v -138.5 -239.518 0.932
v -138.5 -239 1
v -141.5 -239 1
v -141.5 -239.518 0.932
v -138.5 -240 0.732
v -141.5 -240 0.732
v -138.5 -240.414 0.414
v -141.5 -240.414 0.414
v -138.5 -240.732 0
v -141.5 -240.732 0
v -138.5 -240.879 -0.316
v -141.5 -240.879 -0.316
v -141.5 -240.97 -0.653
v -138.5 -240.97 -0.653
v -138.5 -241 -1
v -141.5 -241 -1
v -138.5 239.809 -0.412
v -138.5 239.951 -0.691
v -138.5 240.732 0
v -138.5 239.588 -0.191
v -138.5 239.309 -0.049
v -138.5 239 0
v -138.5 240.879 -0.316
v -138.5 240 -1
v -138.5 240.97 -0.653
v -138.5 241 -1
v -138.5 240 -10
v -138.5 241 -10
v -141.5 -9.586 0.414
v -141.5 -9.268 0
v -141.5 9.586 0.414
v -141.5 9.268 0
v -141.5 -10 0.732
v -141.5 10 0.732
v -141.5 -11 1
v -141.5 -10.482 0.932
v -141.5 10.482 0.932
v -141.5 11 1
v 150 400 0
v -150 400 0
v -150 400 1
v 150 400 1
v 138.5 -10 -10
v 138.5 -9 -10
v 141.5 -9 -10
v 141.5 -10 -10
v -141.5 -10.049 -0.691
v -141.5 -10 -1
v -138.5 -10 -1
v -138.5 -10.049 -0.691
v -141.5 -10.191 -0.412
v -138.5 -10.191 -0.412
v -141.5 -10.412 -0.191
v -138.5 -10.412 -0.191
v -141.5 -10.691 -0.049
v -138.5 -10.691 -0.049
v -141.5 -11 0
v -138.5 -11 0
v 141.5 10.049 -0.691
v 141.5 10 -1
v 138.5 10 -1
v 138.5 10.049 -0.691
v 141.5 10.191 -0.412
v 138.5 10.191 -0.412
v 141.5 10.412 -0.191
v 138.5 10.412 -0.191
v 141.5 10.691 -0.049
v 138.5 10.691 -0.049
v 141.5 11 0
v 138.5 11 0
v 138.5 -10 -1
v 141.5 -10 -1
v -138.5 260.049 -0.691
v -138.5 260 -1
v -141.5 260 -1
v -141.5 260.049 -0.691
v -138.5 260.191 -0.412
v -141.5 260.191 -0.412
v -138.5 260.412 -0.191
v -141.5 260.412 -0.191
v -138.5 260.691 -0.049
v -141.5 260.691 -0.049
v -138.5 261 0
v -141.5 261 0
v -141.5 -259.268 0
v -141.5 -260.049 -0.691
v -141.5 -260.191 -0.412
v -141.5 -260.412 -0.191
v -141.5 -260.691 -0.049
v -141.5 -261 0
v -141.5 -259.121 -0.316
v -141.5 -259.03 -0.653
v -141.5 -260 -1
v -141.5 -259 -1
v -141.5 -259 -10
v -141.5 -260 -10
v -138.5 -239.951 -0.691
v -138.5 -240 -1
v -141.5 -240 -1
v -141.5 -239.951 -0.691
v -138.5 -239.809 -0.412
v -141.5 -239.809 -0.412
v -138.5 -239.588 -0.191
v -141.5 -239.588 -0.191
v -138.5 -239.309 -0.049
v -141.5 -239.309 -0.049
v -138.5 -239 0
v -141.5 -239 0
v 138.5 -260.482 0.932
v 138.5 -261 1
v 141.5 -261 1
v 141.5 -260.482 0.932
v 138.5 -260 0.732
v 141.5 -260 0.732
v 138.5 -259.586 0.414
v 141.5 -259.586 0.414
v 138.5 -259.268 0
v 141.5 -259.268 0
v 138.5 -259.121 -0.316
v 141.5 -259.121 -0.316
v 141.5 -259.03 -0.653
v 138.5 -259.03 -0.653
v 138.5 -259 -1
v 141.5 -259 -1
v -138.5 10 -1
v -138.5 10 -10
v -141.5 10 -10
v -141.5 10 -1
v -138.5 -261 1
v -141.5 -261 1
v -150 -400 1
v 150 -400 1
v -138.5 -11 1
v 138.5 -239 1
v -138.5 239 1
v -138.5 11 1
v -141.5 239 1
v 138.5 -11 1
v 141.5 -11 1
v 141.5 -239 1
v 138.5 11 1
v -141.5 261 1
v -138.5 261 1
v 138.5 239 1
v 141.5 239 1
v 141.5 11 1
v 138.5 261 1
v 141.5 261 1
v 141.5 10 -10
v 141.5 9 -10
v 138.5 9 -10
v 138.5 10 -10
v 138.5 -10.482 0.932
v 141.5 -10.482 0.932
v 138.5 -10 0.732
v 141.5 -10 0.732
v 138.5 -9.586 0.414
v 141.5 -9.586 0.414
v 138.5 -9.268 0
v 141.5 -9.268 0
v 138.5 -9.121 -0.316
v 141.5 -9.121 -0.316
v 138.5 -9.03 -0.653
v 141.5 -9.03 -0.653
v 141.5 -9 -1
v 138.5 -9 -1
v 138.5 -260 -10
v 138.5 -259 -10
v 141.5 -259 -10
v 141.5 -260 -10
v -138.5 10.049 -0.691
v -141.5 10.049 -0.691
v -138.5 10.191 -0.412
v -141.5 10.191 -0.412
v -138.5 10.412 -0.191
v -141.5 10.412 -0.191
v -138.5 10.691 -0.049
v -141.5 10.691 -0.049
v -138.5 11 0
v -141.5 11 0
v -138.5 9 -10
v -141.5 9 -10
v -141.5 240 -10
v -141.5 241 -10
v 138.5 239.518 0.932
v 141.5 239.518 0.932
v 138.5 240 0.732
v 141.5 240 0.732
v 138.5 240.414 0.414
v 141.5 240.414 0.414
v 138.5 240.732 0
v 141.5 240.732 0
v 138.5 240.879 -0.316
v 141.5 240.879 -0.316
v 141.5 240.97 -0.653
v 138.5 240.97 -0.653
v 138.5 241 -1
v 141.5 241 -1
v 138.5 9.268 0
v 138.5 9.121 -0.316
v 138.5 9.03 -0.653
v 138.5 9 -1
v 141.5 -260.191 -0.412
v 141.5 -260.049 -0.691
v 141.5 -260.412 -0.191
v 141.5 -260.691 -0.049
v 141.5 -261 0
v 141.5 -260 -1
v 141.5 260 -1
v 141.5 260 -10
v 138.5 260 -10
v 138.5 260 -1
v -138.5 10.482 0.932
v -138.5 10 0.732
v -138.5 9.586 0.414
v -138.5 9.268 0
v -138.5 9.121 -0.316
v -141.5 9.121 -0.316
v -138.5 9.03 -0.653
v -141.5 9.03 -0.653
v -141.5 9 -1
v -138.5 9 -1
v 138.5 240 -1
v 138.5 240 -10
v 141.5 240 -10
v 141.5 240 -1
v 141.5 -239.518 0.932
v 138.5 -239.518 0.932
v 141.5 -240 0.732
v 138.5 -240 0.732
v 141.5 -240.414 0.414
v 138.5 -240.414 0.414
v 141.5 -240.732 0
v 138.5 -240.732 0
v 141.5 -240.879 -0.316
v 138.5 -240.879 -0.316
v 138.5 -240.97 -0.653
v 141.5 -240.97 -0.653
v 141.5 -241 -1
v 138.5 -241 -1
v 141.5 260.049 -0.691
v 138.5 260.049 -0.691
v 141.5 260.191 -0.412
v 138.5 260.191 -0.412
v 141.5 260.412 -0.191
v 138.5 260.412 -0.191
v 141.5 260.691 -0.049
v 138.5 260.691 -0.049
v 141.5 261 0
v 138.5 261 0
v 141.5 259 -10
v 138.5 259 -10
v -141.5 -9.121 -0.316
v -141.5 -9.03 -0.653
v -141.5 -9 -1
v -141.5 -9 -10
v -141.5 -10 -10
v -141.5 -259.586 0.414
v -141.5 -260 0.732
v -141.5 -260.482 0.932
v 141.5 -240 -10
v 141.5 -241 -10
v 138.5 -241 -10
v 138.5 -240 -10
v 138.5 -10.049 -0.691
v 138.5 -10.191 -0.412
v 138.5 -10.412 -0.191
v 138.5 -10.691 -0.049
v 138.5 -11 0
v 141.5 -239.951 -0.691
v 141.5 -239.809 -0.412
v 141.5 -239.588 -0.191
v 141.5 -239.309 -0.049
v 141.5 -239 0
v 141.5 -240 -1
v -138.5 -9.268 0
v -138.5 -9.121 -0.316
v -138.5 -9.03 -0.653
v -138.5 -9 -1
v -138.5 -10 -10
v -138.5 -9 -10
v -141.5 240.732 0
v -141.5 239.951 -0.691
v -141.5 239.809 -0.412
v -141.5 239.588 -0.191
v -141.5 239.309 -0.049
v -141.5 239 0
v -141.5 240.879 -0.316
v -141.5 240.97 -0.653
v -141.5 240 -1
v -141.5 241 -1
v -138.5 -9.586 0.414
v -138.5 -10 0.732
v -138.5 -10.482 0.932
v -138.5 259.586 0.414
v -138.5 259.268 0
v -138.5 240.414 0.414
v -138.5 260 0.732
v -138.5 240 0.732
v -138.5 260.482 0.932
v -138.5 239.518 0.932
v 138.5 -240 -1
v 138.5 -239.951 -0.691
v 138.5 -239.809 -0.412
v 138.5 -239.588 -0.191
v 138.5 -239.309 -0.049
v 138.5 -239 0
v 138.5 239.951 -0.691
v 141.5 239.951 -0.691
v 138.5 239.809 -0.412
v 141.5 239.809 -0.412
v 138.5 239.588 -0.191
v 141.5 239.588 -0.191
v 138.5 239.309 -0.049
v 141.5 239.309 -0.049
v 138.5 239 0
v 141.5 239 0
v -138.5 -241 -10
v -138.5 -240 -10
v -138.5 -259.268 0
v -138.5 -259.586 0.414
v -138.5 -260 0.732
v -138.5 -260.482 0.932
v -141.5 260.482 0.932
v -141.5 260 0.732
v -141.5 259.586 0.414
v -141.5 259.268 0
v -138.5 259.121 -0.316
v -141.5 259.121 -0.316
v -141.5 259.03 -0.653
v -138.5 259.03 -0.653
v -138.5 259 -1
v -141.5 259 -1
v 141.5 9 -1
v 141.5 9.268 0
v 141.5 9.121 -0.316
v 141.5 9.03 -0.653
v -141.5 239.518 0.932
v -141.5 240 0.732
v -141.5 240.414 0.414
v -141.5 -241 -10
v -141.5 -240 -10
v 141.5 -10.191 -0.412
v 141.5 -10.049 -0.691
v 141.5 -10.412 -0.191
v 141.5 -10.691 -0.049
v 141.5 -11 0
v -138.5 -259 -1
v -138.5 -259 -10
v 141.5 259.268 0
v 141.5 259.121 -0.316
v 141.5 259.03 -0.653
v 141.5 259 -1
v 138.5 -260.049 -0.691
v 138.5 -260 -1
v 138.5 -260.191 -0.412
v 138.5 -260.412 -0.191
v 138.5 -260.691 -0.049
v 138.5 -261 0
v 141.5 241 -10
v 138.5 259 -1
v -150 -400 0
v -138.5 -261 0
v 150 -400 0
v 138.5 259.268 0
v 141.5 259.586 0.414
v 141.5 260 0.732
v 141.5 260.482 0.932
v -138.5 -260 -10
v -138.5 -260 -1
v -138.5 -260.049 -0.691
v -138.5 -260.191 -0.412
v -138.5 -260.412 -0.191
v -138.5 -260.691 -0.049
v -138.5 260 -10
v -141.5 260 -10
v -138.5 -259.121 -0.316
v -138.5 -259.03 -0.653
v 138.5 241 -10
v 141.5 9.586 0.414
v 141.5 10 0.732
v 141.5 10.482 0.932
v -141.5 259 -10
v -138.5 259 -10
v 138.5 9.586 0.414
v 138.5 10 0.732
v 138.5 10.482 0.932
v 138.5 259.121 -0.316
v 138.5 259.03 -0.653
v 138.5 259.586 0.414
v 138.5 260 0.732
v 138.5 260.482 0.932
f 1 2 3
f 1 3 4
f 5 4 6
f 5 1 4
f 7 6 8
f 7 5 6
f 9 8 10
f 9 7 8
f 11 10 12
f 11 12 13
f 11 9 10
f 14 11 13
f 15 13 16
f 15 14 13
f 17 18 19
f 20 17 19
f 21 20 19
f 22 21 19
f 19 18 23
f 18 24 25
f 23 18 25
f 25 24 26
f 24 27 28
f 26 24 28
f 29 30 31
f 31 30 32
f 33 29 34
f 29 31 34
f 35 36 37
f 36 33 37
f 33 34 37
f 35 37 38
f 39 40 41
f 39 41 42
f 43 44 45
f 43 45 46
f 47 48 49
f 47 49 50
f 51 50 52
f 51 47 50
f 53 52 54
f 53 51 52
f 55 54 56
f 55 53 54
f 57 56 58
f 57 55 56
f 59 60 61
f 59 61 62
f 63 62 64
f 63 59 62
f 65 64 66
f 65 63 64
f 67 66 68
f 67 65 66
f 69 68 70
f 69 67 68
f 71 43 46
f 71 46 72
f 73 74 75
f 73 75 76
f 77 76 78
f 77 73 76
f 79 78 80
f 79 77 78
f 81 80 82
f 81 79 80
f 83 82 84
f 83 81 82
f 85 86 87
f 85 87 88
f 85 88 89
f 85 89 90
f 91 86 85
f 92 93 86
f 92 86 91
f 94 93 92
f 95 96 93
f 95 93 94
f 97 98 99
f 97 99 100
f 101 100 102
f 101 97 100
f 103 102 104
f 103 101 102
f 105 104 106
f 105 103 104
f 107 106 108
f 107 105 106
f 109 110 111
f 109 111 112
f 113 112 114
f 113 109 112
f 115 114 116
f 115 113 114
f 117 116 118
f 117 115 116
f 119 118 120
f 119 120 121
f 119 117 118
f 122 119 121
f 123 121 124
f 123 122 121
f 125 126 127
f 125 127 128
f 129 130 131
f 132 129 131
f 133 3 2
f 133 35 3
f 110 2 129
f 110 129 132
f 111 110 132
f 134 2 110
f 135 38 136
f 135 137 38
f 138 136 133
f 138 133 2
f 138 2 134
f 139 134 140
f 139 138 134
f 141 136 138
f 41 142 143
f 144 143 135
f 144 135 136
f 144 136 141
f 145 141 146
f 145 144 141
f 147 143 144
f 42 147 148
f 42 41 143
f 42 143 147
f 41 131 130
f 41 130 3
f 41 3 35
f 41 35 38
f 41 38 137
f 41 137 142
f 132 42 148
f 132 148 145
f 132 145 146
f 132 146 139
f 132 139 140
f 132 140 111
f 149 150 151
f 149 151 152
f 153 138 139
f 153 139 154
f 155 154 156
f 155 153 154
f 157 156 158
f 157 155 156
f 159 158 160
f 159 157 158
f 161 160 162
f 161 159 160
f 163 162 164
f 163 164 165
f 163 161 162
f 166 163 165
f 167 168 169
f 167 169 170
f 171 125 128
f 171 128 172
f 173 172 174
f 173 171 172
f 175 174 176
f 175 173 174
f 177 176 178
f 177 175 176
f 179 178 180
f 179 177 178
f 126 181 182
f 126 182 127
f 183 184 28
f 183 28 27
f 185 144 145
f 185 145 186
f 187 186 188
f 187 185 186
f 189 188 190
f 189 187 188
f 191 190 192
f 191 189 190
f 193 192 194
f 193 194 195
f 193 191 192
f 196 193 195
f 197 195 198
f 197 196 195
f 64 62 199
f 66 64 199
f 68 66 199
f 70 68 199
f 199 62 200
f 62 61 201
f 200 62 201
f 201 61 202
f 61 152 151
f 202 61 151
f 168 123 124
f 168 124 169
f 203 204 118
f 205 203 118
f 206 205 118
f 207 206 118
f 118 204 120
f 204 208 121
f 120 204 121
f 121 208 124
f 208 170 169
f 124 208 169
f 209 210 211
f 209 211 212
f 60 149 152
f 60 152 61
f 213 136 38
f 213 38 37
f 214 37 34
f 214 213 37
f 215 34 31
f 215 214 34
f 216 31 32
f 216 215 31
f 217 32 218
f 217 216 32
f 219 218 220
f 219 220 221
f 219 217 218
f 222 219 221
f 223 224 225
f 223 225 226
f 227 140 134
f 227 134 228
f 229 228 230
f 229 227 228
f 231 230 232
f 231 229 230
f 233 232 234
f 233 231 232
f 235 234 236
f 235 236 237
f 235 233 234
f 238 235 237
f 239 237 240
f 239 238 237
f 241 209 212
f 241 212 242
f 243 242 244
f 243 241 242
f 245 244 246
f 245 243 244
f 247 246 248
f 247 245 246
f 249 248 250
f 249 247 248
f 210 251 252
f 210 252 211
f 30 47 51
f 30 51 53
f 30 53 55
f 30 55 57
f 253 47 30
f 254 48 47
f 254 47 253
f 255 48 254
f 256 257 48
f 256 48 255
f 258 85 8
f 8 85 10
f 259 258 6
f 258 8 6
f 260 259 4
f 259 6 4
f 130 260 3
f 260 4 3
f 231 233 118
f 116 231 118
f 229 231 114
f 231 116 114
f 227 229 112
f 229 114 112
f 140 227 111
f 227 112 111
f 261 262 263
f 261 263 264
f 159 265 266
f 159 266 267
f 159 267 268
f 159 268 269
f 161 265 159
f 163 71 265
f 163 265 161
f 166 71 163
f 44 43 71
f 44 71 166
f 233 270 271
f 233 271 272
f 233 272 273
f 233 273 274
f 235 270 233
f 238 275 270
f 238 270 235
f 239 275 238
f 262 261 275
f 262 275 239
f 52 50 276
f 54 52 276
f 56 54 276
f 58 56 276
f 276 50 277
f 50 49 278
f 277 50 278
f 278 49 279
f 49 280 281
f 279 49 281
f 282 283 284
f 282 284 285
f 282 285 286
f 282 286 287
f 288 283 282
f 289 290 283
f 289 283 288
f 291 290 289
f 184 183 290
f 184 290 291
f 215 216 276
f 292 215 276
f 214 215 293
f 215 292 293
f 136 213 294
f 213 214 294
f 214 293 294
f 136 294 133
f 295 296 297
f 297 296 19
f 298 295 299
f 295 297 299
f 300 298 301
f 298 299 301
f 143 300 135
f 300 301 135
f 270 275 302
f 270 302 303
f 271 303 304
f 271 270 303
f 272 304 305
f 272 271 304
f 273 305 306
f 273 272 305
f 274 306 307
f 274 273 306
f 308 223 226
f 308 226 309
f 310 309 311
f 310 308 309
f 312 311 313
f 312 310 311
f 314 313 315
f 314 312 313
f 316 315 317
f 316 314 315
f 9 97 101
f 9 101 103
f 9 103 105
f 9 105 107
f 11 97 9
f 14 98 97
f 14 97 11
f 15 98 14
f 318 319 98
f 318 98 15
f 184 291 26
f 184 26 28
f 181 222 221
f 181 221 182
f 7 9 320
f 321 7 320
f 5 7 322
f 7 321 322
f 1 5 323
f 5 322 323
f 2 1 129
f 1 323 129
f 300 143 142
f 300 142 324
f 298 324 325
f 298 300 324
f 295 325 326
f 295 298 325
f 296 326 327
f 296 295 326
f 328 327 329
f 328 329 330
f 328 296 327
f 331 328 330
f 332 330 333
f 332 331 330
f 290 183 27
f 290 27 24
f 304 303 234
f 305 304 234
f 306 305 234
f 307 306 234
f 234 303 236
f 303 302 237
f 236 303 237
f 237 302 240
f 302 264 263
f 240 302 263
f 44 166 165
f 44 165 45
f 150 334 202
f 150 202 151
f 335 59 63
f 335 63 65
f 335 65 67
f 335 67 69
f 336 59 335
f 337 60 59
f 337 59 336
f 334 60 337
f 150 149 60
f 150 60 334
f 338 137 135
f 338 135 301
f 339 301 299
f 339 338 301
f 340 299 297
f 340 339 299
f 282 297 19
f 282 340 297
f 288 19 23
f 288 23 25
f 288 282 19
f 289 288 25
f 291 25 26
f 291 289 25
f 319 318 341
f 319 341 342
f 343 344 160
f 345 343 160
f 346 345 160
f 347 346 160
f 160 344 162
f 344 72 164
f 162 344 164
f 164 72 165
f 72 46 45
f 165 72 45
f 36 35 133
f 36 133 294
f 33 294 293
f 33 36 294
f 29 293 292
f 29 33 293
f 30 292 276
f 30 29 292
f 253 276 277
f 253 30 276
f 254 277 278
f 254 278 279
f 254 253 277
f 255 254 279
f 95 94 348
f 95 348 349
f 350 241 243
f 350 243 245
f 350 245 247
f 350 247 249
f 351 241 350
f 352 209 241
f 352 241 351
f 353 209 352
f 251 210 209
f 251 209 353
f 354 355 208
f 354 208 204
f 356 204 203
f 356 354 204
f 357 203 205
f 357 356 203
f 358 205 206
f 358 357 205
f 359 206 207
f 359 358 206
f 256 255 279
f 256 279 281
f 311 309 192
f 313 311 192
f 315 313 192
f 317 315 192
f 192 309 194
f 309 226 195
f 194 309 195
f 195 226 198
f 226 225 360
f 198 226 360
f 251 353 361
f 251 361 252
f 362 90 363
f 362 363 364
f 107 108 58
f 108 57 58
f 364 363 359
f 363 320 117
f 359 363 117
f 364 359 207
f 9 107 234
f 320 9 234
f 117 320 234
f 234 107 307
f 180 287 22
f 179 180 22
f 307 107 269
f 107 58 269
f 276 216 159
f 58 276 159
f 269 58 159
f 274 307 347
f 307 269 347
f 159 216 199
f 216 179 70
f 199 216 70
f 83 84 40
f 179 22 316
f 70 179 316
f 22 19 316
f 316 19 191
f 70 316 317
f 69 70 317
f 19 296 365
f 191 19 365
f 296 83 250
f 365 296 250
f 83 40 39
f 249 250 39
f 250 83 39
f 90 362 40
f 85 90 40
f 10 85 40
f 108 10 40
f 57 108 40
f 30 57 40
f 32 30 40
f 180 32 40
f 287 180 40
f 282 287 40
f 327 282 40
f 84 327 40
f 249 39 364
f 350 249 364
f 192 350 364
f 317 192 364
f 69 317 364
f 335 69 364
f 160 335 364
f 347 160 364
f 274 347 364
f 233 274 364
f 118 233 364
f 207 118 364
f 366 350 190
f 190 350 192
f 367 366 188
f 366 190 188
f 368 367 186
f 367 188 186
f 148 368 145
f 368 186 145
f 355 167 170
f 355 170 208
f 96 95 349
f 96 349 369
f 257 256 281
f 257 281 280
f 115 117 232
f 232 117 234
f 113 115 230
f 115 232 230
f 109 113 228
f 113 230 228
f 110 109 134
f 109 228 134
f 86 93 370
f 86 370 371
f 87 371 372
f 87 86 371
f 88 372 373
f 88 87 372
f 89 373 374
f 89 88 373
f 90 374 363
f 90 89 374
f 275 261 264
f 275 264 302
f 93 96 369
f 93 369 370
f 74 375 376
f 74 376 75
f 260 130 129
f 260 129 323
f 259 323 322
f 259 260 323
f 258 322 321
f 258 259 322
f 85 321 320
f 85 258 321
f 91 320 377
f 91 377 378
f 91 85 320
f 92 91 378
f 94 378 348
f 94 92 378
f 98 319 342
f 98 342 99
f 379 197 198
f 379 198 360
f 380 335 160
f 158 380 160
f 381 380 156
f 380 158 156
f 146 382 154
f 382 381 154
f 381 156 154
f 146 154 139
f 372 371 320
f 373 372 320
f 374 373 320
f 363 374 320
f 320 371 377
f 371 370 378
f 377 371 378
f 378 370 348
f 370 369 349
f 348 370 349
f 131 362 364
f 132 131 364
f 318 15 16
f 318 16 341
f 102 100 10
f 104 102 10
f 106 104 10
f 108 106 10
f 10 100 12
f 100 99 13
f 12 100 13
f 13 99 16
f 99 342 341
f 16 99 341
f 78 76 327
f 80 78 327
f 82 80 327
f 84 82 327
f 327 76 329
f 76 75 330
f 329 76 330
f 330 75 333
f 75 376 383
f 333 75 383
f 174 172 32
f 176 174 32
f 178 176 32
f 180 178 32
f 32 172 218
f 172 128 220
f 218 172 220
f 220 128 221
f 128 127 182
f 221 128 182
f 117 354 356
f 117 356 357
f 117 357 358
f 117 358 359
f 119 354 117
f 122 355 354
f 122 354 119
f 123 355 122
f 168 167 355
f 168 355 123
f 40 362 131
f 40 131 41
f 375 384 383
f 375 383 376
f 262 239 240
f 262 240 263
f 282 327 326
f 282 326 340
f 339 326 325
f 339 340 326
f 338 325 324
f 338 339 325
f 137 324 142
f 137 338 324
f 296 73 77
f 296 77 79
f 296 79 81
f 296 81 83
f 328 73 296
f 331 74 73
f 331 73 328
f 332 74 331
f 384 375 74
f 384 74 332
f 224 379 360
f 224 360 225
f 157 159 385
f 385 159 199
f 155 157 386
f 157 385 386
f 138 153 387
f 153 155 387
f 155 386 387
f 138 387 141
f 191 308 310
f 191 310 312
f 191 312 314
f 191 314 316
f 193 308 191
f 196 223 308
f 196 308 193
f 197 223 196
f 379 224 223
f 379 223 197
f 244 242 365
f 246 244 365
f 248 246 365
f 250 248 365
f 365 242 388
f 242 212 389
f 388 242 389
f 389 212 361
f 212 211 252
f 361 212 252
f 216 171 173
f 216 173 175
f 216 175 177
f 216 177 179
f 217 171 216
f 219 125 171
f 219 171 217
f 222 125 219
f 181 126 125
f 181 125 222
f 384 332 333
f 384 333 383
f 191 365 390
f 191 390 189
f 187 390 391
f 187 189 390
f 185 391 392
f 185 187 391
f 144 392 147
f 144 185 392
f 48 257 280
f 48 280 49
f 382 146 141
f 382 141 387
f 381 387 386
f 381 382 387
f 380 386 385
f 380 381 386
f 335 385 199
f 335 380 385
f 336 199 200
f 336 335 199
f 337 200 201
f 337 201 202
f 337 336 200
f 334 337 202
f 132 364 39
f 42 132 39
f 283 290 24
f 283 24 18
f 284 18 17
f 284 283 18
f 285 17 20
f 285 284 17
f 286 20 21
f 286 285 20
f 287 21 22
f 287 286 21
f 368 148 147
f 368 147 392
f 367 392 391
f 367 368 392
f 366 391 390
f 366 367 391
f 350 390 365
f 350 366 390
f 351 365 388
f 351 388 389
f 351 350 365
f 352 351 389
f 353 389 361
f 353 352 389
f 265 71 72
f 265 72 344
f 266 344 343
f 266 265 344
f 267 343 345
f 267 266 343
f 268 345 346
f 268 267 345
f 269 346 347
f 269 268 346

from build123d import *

# Parameters (mm, degrees)
SKETCH1_W                       = 300
SKETCH1_H                       = 800
BOSS_EXTRUDE1_DEPTH             = 1
SKETCH2_W                       = 3
SKETCH2_H                       = 20
CUT_EXTRUDE1_DEPTH              = 10
EDGE_FLANGE1_STRIP_W            = 6
EDGE_FLANGE1_STRIP_H            = 1
EDGE_FLANGE1_STRIP_CUT_DEPTH    = 3
EDGE_FLANGE1_STRIP_2_W          = 6
EDGE_FLANGE1_STRIP_2_H          = 1
EDGE_FLANGE1_STRIP_CUT_2_DEPTH  = 3
EDGE_FLANGE1_STRIP_3_W          = 6
EDGE_FLANGE1_STRIP_3_H          = 1
EDGE_FLANGE1_STRIP_CUT_3_DEPTH  = 3
EDGE_FLANGE1_STRIP_4_W          = 6
EDGE_FLANGE1_STRIP_4_H          = 1
EDGE_FLANGE1_STRIP_CUT_4_DEPTH  = 3
EDGE_FLANGE1_STRIP_5_W          = 6
EDGE_FLANGE1_STRIP_5_H          = 1
EDGE_FLANGE1_STRIP_CUT_5_DEPTH  = 3
EDGE_FLANGE1_STRIP_6_W          = 6
EDGE_FLANGE1_STRIP_6_H          = 1
EDGE_FLANGE1_STRIP_CUT_6_DEPTH  = 3
EDGE_FLANGE1_STRIP_7_W          = 6
EDGE_FLANGE1_STRIP_7_H          = 1
EDGE_FLANGE1_STRIP_CUT_7_DEPTH  = 3
EDGE_FLANGE1_STRIP_8_W          = 6
EDGE_FLANGE1_STRIP_8_H          = 1
EDGE_FLANGE1_STRIP_CUT_8_DEPTH  = 3
EDGE_FLANGE1_STRIP_9_W          = 6
EDGE_FLANGE1_STRIP_9_H          = 1
EDGE_FLANGE1_STRIP_CUT_9_DEPTH  = 3
EDGE_FLANGE1_STRIP_10_W         = 6
EDGE_FLANGE1_STRIP_10_H         = 1
EDGE_FLANGE1_STRIP_CUT_10_DEPTH = 3
EDGE_FLANGE1_STRIP_11_W         = 6
EDGE_FLANGE1_STRIP_11_H         = 1
EDGE_FLANGE1_STRIP_CUT_11_DEPTH = 3
EDGE_FLANGE1_STRIP_12_W         = 6
EDGE_FLANGE1_STRIP_12_H         = 1
EDGE_FLANGE1_STRIP_CUT_12_DEPTH = 3
EDGE_FLANGE1_DEPTH              = 3
EDGE_FLANGE1_BEND_DEPTH         = 3
EDGE_FLANGE1_BEND_2_DEPTH       = 3
EDGE_FLANGE1_BEND_3_DEPTH       = 3
EDGE_FLANGE1_BEND_4_DEPTH       = 3
EDGE_FLANGE1_BEND_5_DEPTH       = 3
EDGE_FLANGE1_BEND_6_DEPTH       = 3
EDGE_FLANGE1_BEND_7_DEPTH       = 3
EDGE_FLANGE1_BEND_8_DEPTH       = 3
EDGE_FLANGE1_BEND_9_DEPTH       = 3
EDGE_FLANGE1_BEND_10_DEPTH      = 3
EDGE_FLANGE1_BEND_11_DEPTH      = 3


# Sheet-metal steps are written as plain solids
with BuildPart() as part:
    # Sketch1 → Boss-Extrude1 (new body)
    with BuildSketch(Plane.XY):
        Rectangle(SKETCH1_W, SKETCH1_H)
    extrude(amount=BOSS_EXTRUDE1_DEPTH)

    # Sketch2 → Cut-Extrude1 (cut)
    with BuildSketch(Plane.XY.offset(1)):
        with Locations((-140, 250)):
            Rectangle(SKETCH2_W, SKETCH2_H)
        with Locations((140, 250)):
            Rectangle(SKETCH2_W, SKETCH2_H)
        with Locations((140, 0)):
            Rectangle(SKETCH2_W, SKETCH2_H)
        with Locations((140, -250)):
            Rectangle(SKETCH2_W, SKETCH2_H)
        with Locations((-140, 0)):
            Rectangle(SKETCH2_W, SKETCH2_H)
        with Locations((-140, -250)):
            Rectangle(SKETCH2_W, SKETCH2_H)
    extrude(amount=-CUT_EXTRUDE1_DEPTH, mode=Mode.SUBTRACT)

    # Edge-Flange1 strip (across the edge) → Edge-Flange1 strip cut (cut)
    with BuildSketch(Plane(origin=(-138.5, 260, 0), x_dir=(0, 1, 0), z_dir=(-1, 0, 0))):
        with Locations((-2, -0.5)):
            Rectangle(EDGE_FLANGE1_STRIP_W, EDGE_FLANGE1_STRIP_H)
    extrude(amount=EDGE_FLANGE1_STRIP_CUT_DEPTH, mode=Mode.SUBTRACT)

    # Edge-Flange1 strip 2 (across the edge) → Edge-Flange1 strip cut 2 (cut)
    with BuildSketch(Plane(origin=(-141.5, 240, 0), x_dir=(0, -1, 0), z_dir=(1, 0, 0))):
        with Locations((-2, -0.5)):
            Rectangle(EDGE_FLANGE1_STRIP_2_W, EDGE_FLANGE1_STRIP_2_H)
    extrude(amount=EDGE_FLANGE1_STRIP_CUT_2_DEPTH, mode=Mode.SUBTRACT)

    # Edge-Flange1 strip 3 (across the edge) → Edge-Flange1 strip cut 3 (cut)
    with BuildSketch(Plane(origin=(141.5, 260, 0), x_dir=(0, 1, 0), z_dir=(-1, 0, 0))):
        with Locations((-2, -0.5)):
            Rectangle(EDGE_FLANGE1_STRIP_3_W, EDGE_FLANGE1_STRIP_3_H)
    extrude(amount=EDGE_FLANGE1_STRIP_CUT_3_DEPTH, mode=Mode.SUBTRACT)

    # Edge-Flange1 strip 4 (across the edge) → Edge-Flange1 strip cut 4 (cut)
    with BuildSketch(Plane(origin=(138.5, 240, 0), x_dir=(0, -1, 0), z_dir=(1, 0, 0))):
        with Locations((-2, -0.5)):
            Rectangle(EDGE_FLANGE1_STRIP_4_W, EDGE_FLANGE1_STRIP_4_H)
    extrude(amount=EDGE_FLANGE1_STRIP_CUT_4_DEPTH, mode=Mode.SUBTRACT)

    # Edge-Flange1 strip 5 (across the edge) → Edge-Flange1 strip cut 5 (cut)
    with BuildSketch(Plane(origin=(-141.5, -10, 0), x_dir=(0, -1, 0), z_dir=(1, 0, 0))):
        with Locations((-2, -0.5)):
            Rectangle(EDGE_FLANGE1_STRIP_5_W, EDGE_FLANGE1_STRIP_5_H)
    extrude(amount=EDGE_FLANGE1_STRIP_CUT_5_DEPTH, mode=Mode.SUBTRACT)

    # Edge-Flange1 strip 6 (across the edge) → Edge-Flange1 strip cut 6 (cut)
    with BuildSketch(Plane(origin=(138.5, -10, 0), x_dir=(0, -1, 0), z_dir=(1, 0, 0))):
        with Locations((-2, -0.5)):
            Rectangle(EDGE_FLANGE1_STRIP_6_W, EDGE_FLANGE1_STRIP_6_H)
    extrude(amount=EDGE_FLANGE1_STRIP_CUT_6_DEPTH, mode=Mode.SUBTRACT)

    # Edge-Flange1 strip 7 (across the edge) → Edge-Flange1 strip cut 7 (cut)
    with BuildSketch(Plane(origin=(-141.5, -260, 0), x_dir=(0, -1, 0), z_dir=(1, 0, 0))):
        with Locations((-2, -0.5)):
            Rectangle(EDGE_FLANGE1_STRIP_7_W, EDGE_FLANGE1_STRIP_7_H)
    extrude(amount=EDGE_FLANGE1_STRIP_CUT_7_DEPTH, mode=Mode.SUBTRACT)

    # Edge-Flange1 strip 8 (across the edge) → Edge-Flange1 strip cut 8 (cut)
    with BuildSketch(Plane(origin=(138.5, -260, 0), x_dir=(0, -1, 0), z_dir=(1, 0, 0))):
        with Locations((-2, -0.5)):
            Rectangle(EDGE_FLANGE1_STRIP_8_W, EDGE_FLANGE1_STRIP_8_H)
    extrude(amount=EDGE_FLANGE1_STRIP_CUT_8_DEPTH, mode=Mode.SUBTRACT)

    # Edge-Flange1 strip 9 (across the edge) → Edge-Flange1 strip cut 9 (cut)
    with BuildSketch(Plane(origin=(141.5, -240, 0), x_dir=(0, 1, 0), z_dir=(-1, 0, 0))):
        with Locations((-2, -0.5)):
            Rectangle(EDGE_FLANGE1_STRIP_9_W, EDGE_FLANGE1_STRIP_9_H)
    extrude(amount=EDGE_FLANGE1_STRIP_CUT_9_DEPTH, mode=Mode.SUBTRACT)

    # Edge-Flange1 strip 10 (across the edge) → Edge-Flange1 strip cut 10 (cut)
    with BuildSketch(Plane(origin=(141.5, 10, 0), x_dir=(0, 1, 0), z_dir=(-1, 0, 0))):
        with Locations((-2, -0.5)):
            Rectangle(EDGE_FLANGE1_STRIP_10_W, EDGE_FLANGE1_STRIP_10_H)
    extrude(amount=EDGE_FLANGE1_STRIP_CUT_10_DEPTH, mode=Mode.SUBTRACT)

    # Edge-Flange1 strip 11 (across the edge) → Edge-Flange1 strip cut 11 (cut)
    with BuildSketch(Plane(origin=(-138.5, 10, 0), x_dir=(0, 1, 0), z_dir=(-1, 0, 0))):
        with Locations((-2, -0.5)):
            Rectangle(EDGE_FLANGE1_STRIP_11_W, EDGE_FLANGE1_STRIP_11_H)
    extrude(amount=EDGE_FLANGE1_STRIP_CUT_11_DEPTH, mode=Mode.SUBTRACT)

    # Edge-Flange1 strip 12 (across the edge) → Edge-Flange1 strip cut 12 (cut)
    with BuildSketch(Plane(origin=(-138.5, -240, 0), x_dir=(0, 1, 0), z_dir=(-1, 0, 0))):
        with Locations((-2, -0.5)):
            Rectangle(EDGE_FLANGE1_STRIP_12_W, EDGE_FLANGE1_STRIP_12_H)
    extrude(amount=EDGE_FLANGE1_STRIP_CUT_12_DEPTH, mode=Mode.SUBTRACT)

    # Edge-Flange1 section (across the edge) → Edge-Flange1 (add)
    with BuildSketch(Plane(origin=(-138.5, 260, 0), x_dir=(0, 1, 0), z_dir=(-1, 0, 0))):
        with BuildLine():
            Line((-1, 1), (-1, 10))
            Line((-1, 10), (0, 10))
            Line((0, 10), (0, 1))
            ThreePointArc((0, 1), (0.292893219, 0.292893219), (1, 0))
            Line((1, 0), (1, -1))
            ThreePointArc((1, -1), (-0.414213562, -0.414213562), (-1, 1))
        make_face()
    extrude(amount=EDGE_FLANGE1_DEPTH)

    # Edge-Flange1 section 2 (across the edge) → Edge-Flange1 bend (add)
    with BuildSketch(Plane(origin=(-141.5, 240, 0), x_dir=(0, -1, 0), z_dir=(1, 0, 0))):
        with BuildLine():
            Line((-1, 1), (-1, 10))
            Line((-1, 10), (0, 10))
            Line((0, 10), (0, 1))
            ThreePointArc((0, 1), (0.292893219, 0.292893219), (1, 0))
            Line((1, 0), (1, -1))
            ThreePointArc((1, -1), (-0.414213562, -0.414213562), (-1, 1))
        make_face()
    extrude(amount=EDGE_FLANGE1_BEND_DEPTH)

    # Edge-Flange1 section 3 (across the edge) → Edge-Flange1 bend 2 (add)
    with BuildSketch(Plane(origin=(141.5, 260, 0), x_dir=(0, 1, 0), z_dir=(-1, 0, 0))):
        with BuildLine():
            Line((-1, 1), (-1, 10))
            Line((-1, 10), (0, 10))
            Line((0, 10), (0, 1))
            ThreePointArc((0, 1), (0.292893219, 0.292893219), (1, 0))
            Line((1, 0), (1, -1))
            ThreePointArc((1, -1), (-0.414213562, -0.414213562), (-1, 1))
        make_face()
    extrude(amount=EDGE_FLANGE1_BEND_2_DEPTH)

    # Edge-Flange1 section 4 (across the edge) → Edge-Flange1 bend 3 (add)
    with BuildSketch(Plane(origin=(138.5, 240, 0), x_dir=(0, -1, 0), z_dir=(1, 0, 0))):
        with BuildLine():
            Line((-1, 1), (-1, 10))
            Line((-1, 10), (0, 10))
            Line((0, 10), (0, 1))
            ThreePointArc((0, 1), (0.292893219, 0.292893219), (1, 0))
            Line((1, 0), (1, -1))
            ThreePointArc((1, -1), (-0.414213562, -0.414213562), (-1, 1))
        make_face()
    extrude(amount=EDGE_FLANGE1_BEND_3_DEPTH)

    # Edge-Flange1 section 5 (across the edge) → Edge-Flange1 bend 4 (add)
    with BuildSketch(Plane(origin=(-141.5, -10, 0), x_dir=(0, -1, 0), z_dir=(1, 0, 0))):
        with BuildLine():
            Line((-1, 1), (-1, 10))
            Line((-1, 10), (0, 10))
            Line((0, 10), (0, 1))
            ThreePointArc((0, 1), (0.292893219, 0.292893219), (1, 0))
            Line((1, 0), (1, -1))
            ThreePointArc((1, -1), (-0.414213562, -0.414213562), (-1, 1))
        make_face()
    extrude(amount=EDGE_FLANGE1_BEND_4_DEPTH)

    # Edge-Flange1 section 6 (across the edge) → Edge-Flange1 bend 5 (add)
    with BuildSketch(Plane(origin=(138.5, -10, 0), x_dir=(0, -1, 0), z_dir=(1, 0, 0))):
        with BuildLine():
            Line((-1, 1), (-1, 10))
            Line((-1, 10), (0, 10))
            Line((0, 10), (0, 1))
            ThreePointArc((0, 1), (0.292893219, 0.292893219), (1, 0))
            Line((1, 0), (1, -1))
            ThreePointArc((1, -1), (-0.414213562, -0.414213562), (-1, 1))
        make_face()
    extrude(amount=EDGE_FLANGE1_BEND_5_DEPTH)

    # Edge-Flange1 section 7 (across the edge) → Edge-Flange1 bend 6 (add)
    with BuildSketch(Plane(origin=(-141.5, -260, 0), x_dir=(0, -1, 0), z_dir=(1, 0, 0))):
        with BuildLine():
            Line((-1, 1), (-1, 10))
            Line((-1, 10), (0, 10))
            Line((0, 10), (0, 1))
            ThreePointArc((0, 1), (0.292893219, 0.292893219), (1, 0))
            Line((1, 0), (1, -1))
            ThreePointArc((1, -1), (-0.414213562, -0.414213562), (-1, 1))
        make_face()
    extrude(amount=EDGE_FLANGE1_BEND_6_DEPTH)

    # Edge-Flange1 section 8 (across the edge) → Edge-Flange1 bend 7 (add)
    with BuildSketch(Plane(origin=(138.5, -260, 0), x_dir=(0, -1, 0), z_dir=(1, 0, 0))):
        with BuildLine():
            Line((-1, 1), (-1, 10))
            Line((-1, 10), (0, 10))
            Line((0, 10), (0, 1))
            ThreePointArc((0, 1), (0.292893219, 0.292893219), (1, 0))
            Line((1, 0), (1, -1))
            ThreePointArc((1, -1), (-0.414213562, -0.414213562), (-1, 1))
        make_face()
    extrude(amount=EDGE_FLANGE1_BEND_7_DEPTH)

    # Edge-Flange1 section 9 (across the edge) → Edge-Flange1 bend 8 (add)
    with BuildSketch(Plane(origin=(141.5, -240, 0), x_dir=(0, 1, 0), z_dir=(-1, 0, 0))):
        with BuildLine():
            Line((-1, 1), (-1, 10))
            Line((-1, 10), (0, 10))
            Line((0, 10), (0, 1))
            ThreePointArc((0, 1), (0.292893219, 0.292893219), (1, 0))
            Line((1, 0), (1, -1))
            ThreePointArc((1, -1), (-0.414213562, -0.414213562), (-1, 1))
        make_face()
    extrude(amount=EDGE_FLANGE1_BEND_8_DEPTH)

    # Edge-Flange1 section 10 (across the edge) → Edge-Flange1 bend 9 (add)
    with BuildSketch(Plane(origin=(141.5, 10, 0), x_dir=(0, 1, 0), z_dir=(-1, 0, 0))):
        with BuildLine():
            Line((-1, 1), (-1, 10))
            Line((-1, 10), (0, 10))
            Line((0, 10), (0, 1))
            ThreePointArc((0, 1), (0.292893219, 0.292893219), (1, 0))
            Line((1, 0), (1, -1))
            ThreePointArc((1, -1), (-0.414213562, -0.414213562), (-1, 1))
        make_face()
    extrude(amount=EDGE_FLANGE1_BEND_9_DEPTH)

    # Edge-Flange1 section 11 (across the edge) → Edge-Flange1 bend 10 (add)
    with BuildSketch(Plane(origin=(-138.5, 10, 0), x_dir=(0, 1, 0), z_dir=(-1, 0, 0))):
        with BuildLine():
            Line((-1, 1), (-1, 10))
            Line((-1, 10), (0, 10))
            Line((0, 10), (0, 1))
            ThreePointArc((0, 1), (0.292893219, 0.292893219), (1, 0))
            Line((1, 0), (1, -1))
            ThreePointArc((1, -1), (-0.414213562, -0.414213562), (-1, 1))
        make_face()
    extrude(amount=EDGE_FLANGE1_BEND_10_DEPTH)

    # Edge-Flange1 section 12 (across the edge) → Edge-Flange1 bend 11 (add)
    with BuildSketch(Plane(origin=(-138.5, -240, 0), x_dir=(0, 1, 0), z_dir=(-1, 0, 0))):
        with BuildLine():
            Line((-1, 1), (-1, 10))
            Line((-1, 10), (0, 10))
            Line((0, 10), (0, 1))
            ThreePointArc((0, 1), (0.292893219, 0.292893219), (1, 0))
            Line((1, 0), (1, -1))
            ThreePointArc((1, -1), (-0.414213562, -0.414213562), (-1, 1))
        make_face()
    extrude(amount=EDGE_FLANGE1_BEND_11_DEPTH)


solid = part.part
